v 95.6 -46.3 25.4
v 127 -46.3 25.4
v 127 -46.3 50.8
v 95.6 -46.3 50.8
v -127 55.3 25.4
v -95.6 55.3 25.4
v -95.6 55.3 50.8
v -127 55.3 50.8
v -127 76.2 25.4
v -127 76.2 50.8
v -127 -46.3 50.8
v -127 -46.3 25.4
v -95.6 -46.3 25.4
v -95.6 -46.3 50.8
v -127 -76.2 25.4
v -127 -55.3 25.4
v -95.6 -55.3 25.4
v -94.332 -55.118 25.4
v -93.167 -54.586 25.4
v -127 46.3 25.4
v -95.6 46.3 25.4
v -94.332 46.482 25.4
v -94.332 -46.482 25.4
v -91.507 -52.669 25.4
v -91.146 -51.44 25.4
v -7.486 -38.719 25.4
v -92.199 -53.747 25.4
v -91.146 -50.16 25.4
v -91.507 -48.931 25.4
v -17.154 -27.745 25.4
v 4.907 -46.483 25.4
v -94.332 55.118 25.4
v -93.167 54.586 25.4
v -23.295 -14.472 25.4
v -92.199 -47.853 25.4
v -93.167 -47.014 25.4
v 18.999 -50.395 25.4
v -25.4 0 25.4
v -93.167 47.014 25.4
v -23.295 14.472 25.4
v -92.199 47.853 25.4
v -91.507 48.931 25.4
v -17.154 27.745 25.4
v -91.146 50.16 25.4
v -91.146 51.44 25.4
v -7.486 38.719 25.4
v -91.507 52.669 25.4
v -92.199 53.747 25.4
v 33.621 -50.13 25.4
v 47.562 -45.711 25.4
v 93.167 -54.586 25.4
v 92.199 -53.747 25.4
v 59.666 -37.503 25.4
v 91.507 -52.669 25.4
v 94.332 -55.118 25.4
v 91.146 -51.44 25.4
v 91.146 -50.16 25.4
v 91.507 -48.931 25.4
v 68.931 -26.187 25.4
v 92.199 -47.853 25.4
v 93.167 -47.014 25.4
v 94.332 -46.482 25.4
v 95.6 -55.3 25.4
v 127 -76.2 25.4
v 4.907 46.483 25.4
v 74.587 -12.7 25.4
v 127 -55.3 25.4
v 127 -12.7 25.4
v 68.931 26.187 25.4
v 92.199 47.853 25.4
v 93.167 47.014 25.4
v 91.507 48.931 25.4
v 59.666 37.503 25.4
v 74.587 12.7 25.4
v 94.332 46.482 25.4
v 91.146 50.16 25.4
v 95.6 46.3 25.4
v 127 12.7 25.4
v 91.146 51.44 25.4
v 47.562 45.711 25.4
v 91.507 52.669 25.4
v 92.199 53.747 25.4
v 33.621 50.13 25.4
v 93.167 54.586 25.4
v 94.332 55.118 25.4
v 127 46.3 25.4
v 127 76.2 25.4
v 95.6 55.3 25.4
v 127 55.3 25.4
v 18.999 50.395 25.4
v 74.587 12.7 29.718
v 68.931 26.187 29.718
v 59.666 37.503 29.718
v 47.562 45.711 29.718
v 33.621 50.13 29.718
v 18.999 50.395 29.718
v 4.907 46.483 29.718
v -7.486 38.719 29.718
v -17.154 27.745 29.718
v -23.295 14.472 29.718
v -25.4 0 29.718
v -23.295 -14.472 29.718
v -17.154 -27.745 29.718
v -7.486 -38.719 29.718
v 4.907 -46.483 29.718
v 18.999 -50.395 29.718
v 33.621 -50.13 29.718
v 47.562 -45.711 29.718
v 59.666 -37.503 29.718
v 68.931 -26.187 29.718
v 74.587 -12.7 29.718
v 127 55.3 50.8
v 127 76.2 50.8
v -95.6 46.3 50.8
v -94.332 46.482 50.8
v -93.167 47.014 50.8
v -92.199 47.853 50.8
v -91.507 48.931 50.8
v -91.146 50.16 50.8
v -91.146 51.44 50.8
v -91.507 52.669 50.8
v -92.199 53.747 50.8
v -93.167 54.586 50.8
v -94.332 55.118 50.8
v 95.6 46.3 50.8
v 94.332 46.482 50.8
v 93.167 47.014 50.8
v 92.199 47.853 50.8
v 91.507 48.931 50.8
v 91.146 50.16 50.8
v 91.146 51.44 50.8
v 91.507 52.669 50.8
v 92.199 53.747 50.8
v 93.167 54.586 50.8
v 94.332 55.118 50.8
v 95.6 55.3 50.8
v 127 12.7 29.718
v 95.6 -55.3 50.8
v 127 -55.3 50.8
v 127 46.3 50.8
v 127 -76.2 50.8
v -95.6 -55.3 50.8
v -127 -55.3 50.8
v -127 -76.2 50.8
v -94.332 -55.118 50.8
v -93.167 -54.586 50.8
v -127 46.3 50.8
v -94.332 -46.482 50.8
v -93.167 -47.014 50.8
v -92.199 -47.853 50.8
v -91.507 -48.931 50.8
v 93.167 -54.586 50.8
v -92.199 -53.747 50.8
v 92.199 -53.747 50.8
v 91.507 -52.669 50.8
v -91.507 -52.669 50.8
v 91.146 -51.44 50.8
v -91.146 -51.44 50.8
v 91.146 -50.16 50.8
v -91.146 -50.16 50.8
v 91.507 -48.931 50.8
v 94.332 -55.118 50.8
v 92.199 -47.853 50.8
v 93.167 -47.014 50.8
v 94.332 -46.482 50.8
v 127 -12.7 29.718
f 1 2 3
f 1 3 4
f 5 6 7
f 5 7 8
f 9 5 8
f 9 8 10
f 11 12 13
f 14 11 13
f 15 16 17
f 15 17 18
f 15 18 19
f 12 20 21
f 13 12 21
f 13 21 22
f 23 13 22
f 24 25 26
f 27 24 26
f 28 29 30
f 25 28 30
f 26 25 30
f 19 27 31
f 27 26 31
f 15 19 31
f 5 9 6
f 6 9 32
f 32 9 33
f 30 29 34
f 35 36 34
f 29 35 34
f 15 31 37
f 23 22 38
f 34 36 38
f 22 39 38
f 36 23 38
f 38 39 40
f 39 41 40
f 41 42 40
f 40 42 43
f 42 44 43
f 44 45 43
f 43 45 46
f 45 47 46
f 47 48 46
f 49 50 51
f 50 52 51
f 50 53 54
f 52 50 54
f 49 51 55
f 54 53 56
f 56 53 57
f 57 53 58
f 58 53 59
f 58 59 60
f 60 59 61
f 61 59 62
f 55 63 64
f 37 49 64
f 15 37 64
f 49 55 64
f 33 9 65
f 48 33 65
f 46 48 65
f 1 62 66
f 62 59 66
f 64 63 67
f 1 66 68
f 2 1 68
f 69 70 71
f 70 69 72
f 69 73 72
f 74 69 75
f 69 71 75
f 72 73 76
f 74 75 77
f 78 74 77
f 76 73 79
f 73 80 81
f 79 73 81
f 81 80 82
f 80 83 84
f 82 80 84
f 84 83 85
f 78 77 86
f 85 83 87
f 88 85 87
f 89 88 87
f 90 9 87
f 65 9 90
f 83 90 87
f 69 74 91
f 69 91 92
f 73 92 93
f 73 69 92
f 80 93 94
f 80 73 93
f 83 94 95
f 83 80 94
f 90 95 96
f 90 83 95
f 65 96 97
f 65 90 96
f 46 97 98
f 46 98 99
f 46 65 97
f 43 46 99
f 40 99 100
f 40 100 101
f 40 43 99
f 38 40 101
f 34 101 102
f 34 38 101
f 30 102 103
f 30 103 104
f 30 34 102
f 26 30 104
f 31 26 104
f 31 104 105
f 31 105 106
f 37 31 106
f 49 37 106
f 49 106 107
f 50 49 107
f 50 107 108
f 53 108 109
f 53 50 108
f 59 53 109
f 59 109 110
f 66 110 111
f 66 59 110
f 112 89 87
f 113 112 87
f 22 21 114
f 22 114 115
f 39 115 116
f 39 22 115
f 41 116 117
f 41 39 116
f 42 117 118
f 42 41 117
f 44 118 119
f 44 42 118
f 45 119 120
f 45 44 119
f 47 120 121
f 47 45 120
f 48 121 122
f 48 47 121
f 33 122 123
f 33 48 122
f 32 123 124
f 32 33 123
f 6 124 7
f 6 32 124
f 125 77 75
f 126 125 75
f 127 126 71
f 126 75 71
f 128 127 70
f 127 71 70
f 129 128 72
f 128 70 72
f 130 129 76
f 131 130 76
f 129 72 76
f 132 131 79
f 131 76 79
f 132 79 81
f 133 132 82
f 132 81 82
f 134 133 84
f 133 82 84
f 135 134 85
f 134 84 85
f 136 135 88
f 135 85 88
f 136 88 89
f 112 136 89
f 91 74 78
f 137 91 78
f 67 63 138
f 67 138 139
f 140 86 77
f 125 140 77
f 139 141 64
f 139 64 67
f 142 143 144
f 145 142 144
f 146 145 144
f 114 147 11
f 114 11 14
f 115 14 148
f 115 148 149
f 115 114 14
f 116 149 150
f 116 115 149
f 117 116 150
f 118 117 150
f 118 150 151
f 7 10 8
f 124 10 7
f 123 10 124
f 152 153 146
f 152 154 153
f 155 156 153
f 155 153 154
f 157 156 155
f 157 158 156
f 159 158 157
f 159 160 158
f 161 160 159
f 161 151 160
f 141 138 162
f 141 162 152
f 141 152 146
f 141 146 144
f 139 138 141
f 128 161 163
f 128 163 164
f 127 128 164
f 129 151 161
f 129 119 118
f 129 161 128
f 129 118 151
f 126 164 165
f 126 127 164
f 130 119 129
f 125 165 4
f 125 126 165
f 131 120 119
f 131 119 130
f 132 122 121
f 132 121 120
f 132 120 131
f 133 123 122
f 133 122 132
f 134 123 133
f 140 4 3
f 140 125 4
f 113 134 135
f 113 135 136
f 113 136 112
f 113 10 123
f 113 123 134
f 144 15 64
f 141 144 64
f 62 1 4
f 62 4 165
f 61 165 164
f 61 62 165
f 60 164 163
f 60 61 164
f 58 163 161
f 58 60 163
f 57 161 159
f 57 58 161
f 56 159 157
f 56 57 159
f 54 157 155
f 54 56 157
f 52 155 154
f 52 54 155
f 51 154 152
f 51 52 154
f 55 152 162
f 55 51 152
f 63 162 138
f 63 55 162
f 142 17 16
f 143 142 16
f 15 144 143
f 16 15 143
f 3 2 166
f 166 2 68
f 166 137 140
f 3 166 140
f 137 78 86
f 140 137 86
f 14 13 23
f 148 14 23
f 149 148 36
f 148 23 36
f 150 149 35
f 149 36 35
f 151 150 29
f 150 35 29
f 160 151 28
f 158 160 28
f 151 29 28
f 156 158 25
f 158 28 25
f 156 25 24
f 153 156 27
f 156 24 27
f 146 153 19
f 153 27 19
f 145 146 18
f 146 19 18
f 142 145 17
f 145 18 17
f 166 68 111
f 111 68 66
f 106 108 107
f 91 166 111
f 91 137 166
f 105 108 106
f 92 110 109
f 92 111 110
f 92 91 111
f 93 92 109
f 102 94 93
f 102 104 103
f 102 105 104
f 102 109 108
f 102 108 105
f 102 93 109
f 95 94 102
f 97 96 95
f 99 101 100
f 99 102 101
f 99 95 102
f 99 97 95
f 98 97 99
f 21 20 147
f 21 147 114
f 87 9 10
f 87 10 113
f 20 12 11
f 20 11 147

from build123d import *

# Parameters (mm, degrees)
SKETCH003_W                   = 254
SKETCH003_H                   = 152.4
PAD001_DEPTH                  = 25.4
POCKET002_DEPTH               = 619.999755
POCKET003_DEPTH               = 4.318
POCKET002_MIRRORED002_2_DEPTH = 619.999755


with BuildPart() as part:
    # Sketch003 (on Face1 of ShapeBinder) → Pad001 (new body)
    with BuildSketch(Plane.XY.offset(25.4)):
        Rectangle(SKETCH003_W, SKETCH003_H)
    extrude(amount=PAD001_DEPTH)

    # Sketch004 (on Face1 of ShapeBinder) → Pocket002 (cut, through all)
    with BuildSketch(Plane.XY.offset(25.4)):
        with BuildLine():
            ThreePointArc((-95.6, 46.3), (-91.1, 50.8), (-95.6, 55.3))
            Line((-95.6, 55.3), (-127, 55.3))
            Line((-127, 55.3), (-127, 46.3))
            Line((-127, 46.3), (-95.6, 46.3))
        make_face()
    pocket002 = extrude(amount=POCKET002_DEPTH, mode=Mode.SUBTRACT)

    # Sketch005 (on Face1 of ShapeBinder) → Pocket003 (cut)
    with BuildSketch(Plane.XY.offset(25.4)):
        with BuildLine():
            Line((127, -12.7), (74.586888, -12.7))
            ThreePointArc((74.586888, 12.7), (-25.4, 0), (74.586888, -12.7))
            Line((74.586888, 12.7), (127, 12.7))
            Line((127, 12.7), (127, -12.7))
        make_face()
    extrude(amount=POCKET003_DEPTH, mode=Mode.SUBTRACT)

    # Sketch004 Mirrored002 2 → Pocket002 Mirrored002 2 (cut, through all)
    with BuildSketch(Plane(origin=(0, 0, 25.4), x_dir=(-1, 0, 0), z_dir=(0, 0, -1))):
        with BuildLine():
            ThreePointArc((-95.6, 46.3), (-91.1, 50.8), (-95.6, 55.3))
            Line((-95.6, 55.3), (-127, 55.3))
            Line((-127, 55.3), (-127, 46.3))
            Line((-127, 46.3), (-95.6, 46.3))
        make_face()
    pocket002_mirrored002_2 = extrude(amount=-POCKET002_MIRRORED002_2_DEPTH, mode=Mode.SUBTRACT)

    # Mirrored003: Pocket002, Pocket002 Mirrored002 2 across XZ
    add(pocket002.mirror(Plane.XZ), mode=Mode.SUBTRACT)
    add(pocket002_mirrored002_2.mirror(Plane.XZ), mode=Mode.SUBTRACT)


solid = part.part
